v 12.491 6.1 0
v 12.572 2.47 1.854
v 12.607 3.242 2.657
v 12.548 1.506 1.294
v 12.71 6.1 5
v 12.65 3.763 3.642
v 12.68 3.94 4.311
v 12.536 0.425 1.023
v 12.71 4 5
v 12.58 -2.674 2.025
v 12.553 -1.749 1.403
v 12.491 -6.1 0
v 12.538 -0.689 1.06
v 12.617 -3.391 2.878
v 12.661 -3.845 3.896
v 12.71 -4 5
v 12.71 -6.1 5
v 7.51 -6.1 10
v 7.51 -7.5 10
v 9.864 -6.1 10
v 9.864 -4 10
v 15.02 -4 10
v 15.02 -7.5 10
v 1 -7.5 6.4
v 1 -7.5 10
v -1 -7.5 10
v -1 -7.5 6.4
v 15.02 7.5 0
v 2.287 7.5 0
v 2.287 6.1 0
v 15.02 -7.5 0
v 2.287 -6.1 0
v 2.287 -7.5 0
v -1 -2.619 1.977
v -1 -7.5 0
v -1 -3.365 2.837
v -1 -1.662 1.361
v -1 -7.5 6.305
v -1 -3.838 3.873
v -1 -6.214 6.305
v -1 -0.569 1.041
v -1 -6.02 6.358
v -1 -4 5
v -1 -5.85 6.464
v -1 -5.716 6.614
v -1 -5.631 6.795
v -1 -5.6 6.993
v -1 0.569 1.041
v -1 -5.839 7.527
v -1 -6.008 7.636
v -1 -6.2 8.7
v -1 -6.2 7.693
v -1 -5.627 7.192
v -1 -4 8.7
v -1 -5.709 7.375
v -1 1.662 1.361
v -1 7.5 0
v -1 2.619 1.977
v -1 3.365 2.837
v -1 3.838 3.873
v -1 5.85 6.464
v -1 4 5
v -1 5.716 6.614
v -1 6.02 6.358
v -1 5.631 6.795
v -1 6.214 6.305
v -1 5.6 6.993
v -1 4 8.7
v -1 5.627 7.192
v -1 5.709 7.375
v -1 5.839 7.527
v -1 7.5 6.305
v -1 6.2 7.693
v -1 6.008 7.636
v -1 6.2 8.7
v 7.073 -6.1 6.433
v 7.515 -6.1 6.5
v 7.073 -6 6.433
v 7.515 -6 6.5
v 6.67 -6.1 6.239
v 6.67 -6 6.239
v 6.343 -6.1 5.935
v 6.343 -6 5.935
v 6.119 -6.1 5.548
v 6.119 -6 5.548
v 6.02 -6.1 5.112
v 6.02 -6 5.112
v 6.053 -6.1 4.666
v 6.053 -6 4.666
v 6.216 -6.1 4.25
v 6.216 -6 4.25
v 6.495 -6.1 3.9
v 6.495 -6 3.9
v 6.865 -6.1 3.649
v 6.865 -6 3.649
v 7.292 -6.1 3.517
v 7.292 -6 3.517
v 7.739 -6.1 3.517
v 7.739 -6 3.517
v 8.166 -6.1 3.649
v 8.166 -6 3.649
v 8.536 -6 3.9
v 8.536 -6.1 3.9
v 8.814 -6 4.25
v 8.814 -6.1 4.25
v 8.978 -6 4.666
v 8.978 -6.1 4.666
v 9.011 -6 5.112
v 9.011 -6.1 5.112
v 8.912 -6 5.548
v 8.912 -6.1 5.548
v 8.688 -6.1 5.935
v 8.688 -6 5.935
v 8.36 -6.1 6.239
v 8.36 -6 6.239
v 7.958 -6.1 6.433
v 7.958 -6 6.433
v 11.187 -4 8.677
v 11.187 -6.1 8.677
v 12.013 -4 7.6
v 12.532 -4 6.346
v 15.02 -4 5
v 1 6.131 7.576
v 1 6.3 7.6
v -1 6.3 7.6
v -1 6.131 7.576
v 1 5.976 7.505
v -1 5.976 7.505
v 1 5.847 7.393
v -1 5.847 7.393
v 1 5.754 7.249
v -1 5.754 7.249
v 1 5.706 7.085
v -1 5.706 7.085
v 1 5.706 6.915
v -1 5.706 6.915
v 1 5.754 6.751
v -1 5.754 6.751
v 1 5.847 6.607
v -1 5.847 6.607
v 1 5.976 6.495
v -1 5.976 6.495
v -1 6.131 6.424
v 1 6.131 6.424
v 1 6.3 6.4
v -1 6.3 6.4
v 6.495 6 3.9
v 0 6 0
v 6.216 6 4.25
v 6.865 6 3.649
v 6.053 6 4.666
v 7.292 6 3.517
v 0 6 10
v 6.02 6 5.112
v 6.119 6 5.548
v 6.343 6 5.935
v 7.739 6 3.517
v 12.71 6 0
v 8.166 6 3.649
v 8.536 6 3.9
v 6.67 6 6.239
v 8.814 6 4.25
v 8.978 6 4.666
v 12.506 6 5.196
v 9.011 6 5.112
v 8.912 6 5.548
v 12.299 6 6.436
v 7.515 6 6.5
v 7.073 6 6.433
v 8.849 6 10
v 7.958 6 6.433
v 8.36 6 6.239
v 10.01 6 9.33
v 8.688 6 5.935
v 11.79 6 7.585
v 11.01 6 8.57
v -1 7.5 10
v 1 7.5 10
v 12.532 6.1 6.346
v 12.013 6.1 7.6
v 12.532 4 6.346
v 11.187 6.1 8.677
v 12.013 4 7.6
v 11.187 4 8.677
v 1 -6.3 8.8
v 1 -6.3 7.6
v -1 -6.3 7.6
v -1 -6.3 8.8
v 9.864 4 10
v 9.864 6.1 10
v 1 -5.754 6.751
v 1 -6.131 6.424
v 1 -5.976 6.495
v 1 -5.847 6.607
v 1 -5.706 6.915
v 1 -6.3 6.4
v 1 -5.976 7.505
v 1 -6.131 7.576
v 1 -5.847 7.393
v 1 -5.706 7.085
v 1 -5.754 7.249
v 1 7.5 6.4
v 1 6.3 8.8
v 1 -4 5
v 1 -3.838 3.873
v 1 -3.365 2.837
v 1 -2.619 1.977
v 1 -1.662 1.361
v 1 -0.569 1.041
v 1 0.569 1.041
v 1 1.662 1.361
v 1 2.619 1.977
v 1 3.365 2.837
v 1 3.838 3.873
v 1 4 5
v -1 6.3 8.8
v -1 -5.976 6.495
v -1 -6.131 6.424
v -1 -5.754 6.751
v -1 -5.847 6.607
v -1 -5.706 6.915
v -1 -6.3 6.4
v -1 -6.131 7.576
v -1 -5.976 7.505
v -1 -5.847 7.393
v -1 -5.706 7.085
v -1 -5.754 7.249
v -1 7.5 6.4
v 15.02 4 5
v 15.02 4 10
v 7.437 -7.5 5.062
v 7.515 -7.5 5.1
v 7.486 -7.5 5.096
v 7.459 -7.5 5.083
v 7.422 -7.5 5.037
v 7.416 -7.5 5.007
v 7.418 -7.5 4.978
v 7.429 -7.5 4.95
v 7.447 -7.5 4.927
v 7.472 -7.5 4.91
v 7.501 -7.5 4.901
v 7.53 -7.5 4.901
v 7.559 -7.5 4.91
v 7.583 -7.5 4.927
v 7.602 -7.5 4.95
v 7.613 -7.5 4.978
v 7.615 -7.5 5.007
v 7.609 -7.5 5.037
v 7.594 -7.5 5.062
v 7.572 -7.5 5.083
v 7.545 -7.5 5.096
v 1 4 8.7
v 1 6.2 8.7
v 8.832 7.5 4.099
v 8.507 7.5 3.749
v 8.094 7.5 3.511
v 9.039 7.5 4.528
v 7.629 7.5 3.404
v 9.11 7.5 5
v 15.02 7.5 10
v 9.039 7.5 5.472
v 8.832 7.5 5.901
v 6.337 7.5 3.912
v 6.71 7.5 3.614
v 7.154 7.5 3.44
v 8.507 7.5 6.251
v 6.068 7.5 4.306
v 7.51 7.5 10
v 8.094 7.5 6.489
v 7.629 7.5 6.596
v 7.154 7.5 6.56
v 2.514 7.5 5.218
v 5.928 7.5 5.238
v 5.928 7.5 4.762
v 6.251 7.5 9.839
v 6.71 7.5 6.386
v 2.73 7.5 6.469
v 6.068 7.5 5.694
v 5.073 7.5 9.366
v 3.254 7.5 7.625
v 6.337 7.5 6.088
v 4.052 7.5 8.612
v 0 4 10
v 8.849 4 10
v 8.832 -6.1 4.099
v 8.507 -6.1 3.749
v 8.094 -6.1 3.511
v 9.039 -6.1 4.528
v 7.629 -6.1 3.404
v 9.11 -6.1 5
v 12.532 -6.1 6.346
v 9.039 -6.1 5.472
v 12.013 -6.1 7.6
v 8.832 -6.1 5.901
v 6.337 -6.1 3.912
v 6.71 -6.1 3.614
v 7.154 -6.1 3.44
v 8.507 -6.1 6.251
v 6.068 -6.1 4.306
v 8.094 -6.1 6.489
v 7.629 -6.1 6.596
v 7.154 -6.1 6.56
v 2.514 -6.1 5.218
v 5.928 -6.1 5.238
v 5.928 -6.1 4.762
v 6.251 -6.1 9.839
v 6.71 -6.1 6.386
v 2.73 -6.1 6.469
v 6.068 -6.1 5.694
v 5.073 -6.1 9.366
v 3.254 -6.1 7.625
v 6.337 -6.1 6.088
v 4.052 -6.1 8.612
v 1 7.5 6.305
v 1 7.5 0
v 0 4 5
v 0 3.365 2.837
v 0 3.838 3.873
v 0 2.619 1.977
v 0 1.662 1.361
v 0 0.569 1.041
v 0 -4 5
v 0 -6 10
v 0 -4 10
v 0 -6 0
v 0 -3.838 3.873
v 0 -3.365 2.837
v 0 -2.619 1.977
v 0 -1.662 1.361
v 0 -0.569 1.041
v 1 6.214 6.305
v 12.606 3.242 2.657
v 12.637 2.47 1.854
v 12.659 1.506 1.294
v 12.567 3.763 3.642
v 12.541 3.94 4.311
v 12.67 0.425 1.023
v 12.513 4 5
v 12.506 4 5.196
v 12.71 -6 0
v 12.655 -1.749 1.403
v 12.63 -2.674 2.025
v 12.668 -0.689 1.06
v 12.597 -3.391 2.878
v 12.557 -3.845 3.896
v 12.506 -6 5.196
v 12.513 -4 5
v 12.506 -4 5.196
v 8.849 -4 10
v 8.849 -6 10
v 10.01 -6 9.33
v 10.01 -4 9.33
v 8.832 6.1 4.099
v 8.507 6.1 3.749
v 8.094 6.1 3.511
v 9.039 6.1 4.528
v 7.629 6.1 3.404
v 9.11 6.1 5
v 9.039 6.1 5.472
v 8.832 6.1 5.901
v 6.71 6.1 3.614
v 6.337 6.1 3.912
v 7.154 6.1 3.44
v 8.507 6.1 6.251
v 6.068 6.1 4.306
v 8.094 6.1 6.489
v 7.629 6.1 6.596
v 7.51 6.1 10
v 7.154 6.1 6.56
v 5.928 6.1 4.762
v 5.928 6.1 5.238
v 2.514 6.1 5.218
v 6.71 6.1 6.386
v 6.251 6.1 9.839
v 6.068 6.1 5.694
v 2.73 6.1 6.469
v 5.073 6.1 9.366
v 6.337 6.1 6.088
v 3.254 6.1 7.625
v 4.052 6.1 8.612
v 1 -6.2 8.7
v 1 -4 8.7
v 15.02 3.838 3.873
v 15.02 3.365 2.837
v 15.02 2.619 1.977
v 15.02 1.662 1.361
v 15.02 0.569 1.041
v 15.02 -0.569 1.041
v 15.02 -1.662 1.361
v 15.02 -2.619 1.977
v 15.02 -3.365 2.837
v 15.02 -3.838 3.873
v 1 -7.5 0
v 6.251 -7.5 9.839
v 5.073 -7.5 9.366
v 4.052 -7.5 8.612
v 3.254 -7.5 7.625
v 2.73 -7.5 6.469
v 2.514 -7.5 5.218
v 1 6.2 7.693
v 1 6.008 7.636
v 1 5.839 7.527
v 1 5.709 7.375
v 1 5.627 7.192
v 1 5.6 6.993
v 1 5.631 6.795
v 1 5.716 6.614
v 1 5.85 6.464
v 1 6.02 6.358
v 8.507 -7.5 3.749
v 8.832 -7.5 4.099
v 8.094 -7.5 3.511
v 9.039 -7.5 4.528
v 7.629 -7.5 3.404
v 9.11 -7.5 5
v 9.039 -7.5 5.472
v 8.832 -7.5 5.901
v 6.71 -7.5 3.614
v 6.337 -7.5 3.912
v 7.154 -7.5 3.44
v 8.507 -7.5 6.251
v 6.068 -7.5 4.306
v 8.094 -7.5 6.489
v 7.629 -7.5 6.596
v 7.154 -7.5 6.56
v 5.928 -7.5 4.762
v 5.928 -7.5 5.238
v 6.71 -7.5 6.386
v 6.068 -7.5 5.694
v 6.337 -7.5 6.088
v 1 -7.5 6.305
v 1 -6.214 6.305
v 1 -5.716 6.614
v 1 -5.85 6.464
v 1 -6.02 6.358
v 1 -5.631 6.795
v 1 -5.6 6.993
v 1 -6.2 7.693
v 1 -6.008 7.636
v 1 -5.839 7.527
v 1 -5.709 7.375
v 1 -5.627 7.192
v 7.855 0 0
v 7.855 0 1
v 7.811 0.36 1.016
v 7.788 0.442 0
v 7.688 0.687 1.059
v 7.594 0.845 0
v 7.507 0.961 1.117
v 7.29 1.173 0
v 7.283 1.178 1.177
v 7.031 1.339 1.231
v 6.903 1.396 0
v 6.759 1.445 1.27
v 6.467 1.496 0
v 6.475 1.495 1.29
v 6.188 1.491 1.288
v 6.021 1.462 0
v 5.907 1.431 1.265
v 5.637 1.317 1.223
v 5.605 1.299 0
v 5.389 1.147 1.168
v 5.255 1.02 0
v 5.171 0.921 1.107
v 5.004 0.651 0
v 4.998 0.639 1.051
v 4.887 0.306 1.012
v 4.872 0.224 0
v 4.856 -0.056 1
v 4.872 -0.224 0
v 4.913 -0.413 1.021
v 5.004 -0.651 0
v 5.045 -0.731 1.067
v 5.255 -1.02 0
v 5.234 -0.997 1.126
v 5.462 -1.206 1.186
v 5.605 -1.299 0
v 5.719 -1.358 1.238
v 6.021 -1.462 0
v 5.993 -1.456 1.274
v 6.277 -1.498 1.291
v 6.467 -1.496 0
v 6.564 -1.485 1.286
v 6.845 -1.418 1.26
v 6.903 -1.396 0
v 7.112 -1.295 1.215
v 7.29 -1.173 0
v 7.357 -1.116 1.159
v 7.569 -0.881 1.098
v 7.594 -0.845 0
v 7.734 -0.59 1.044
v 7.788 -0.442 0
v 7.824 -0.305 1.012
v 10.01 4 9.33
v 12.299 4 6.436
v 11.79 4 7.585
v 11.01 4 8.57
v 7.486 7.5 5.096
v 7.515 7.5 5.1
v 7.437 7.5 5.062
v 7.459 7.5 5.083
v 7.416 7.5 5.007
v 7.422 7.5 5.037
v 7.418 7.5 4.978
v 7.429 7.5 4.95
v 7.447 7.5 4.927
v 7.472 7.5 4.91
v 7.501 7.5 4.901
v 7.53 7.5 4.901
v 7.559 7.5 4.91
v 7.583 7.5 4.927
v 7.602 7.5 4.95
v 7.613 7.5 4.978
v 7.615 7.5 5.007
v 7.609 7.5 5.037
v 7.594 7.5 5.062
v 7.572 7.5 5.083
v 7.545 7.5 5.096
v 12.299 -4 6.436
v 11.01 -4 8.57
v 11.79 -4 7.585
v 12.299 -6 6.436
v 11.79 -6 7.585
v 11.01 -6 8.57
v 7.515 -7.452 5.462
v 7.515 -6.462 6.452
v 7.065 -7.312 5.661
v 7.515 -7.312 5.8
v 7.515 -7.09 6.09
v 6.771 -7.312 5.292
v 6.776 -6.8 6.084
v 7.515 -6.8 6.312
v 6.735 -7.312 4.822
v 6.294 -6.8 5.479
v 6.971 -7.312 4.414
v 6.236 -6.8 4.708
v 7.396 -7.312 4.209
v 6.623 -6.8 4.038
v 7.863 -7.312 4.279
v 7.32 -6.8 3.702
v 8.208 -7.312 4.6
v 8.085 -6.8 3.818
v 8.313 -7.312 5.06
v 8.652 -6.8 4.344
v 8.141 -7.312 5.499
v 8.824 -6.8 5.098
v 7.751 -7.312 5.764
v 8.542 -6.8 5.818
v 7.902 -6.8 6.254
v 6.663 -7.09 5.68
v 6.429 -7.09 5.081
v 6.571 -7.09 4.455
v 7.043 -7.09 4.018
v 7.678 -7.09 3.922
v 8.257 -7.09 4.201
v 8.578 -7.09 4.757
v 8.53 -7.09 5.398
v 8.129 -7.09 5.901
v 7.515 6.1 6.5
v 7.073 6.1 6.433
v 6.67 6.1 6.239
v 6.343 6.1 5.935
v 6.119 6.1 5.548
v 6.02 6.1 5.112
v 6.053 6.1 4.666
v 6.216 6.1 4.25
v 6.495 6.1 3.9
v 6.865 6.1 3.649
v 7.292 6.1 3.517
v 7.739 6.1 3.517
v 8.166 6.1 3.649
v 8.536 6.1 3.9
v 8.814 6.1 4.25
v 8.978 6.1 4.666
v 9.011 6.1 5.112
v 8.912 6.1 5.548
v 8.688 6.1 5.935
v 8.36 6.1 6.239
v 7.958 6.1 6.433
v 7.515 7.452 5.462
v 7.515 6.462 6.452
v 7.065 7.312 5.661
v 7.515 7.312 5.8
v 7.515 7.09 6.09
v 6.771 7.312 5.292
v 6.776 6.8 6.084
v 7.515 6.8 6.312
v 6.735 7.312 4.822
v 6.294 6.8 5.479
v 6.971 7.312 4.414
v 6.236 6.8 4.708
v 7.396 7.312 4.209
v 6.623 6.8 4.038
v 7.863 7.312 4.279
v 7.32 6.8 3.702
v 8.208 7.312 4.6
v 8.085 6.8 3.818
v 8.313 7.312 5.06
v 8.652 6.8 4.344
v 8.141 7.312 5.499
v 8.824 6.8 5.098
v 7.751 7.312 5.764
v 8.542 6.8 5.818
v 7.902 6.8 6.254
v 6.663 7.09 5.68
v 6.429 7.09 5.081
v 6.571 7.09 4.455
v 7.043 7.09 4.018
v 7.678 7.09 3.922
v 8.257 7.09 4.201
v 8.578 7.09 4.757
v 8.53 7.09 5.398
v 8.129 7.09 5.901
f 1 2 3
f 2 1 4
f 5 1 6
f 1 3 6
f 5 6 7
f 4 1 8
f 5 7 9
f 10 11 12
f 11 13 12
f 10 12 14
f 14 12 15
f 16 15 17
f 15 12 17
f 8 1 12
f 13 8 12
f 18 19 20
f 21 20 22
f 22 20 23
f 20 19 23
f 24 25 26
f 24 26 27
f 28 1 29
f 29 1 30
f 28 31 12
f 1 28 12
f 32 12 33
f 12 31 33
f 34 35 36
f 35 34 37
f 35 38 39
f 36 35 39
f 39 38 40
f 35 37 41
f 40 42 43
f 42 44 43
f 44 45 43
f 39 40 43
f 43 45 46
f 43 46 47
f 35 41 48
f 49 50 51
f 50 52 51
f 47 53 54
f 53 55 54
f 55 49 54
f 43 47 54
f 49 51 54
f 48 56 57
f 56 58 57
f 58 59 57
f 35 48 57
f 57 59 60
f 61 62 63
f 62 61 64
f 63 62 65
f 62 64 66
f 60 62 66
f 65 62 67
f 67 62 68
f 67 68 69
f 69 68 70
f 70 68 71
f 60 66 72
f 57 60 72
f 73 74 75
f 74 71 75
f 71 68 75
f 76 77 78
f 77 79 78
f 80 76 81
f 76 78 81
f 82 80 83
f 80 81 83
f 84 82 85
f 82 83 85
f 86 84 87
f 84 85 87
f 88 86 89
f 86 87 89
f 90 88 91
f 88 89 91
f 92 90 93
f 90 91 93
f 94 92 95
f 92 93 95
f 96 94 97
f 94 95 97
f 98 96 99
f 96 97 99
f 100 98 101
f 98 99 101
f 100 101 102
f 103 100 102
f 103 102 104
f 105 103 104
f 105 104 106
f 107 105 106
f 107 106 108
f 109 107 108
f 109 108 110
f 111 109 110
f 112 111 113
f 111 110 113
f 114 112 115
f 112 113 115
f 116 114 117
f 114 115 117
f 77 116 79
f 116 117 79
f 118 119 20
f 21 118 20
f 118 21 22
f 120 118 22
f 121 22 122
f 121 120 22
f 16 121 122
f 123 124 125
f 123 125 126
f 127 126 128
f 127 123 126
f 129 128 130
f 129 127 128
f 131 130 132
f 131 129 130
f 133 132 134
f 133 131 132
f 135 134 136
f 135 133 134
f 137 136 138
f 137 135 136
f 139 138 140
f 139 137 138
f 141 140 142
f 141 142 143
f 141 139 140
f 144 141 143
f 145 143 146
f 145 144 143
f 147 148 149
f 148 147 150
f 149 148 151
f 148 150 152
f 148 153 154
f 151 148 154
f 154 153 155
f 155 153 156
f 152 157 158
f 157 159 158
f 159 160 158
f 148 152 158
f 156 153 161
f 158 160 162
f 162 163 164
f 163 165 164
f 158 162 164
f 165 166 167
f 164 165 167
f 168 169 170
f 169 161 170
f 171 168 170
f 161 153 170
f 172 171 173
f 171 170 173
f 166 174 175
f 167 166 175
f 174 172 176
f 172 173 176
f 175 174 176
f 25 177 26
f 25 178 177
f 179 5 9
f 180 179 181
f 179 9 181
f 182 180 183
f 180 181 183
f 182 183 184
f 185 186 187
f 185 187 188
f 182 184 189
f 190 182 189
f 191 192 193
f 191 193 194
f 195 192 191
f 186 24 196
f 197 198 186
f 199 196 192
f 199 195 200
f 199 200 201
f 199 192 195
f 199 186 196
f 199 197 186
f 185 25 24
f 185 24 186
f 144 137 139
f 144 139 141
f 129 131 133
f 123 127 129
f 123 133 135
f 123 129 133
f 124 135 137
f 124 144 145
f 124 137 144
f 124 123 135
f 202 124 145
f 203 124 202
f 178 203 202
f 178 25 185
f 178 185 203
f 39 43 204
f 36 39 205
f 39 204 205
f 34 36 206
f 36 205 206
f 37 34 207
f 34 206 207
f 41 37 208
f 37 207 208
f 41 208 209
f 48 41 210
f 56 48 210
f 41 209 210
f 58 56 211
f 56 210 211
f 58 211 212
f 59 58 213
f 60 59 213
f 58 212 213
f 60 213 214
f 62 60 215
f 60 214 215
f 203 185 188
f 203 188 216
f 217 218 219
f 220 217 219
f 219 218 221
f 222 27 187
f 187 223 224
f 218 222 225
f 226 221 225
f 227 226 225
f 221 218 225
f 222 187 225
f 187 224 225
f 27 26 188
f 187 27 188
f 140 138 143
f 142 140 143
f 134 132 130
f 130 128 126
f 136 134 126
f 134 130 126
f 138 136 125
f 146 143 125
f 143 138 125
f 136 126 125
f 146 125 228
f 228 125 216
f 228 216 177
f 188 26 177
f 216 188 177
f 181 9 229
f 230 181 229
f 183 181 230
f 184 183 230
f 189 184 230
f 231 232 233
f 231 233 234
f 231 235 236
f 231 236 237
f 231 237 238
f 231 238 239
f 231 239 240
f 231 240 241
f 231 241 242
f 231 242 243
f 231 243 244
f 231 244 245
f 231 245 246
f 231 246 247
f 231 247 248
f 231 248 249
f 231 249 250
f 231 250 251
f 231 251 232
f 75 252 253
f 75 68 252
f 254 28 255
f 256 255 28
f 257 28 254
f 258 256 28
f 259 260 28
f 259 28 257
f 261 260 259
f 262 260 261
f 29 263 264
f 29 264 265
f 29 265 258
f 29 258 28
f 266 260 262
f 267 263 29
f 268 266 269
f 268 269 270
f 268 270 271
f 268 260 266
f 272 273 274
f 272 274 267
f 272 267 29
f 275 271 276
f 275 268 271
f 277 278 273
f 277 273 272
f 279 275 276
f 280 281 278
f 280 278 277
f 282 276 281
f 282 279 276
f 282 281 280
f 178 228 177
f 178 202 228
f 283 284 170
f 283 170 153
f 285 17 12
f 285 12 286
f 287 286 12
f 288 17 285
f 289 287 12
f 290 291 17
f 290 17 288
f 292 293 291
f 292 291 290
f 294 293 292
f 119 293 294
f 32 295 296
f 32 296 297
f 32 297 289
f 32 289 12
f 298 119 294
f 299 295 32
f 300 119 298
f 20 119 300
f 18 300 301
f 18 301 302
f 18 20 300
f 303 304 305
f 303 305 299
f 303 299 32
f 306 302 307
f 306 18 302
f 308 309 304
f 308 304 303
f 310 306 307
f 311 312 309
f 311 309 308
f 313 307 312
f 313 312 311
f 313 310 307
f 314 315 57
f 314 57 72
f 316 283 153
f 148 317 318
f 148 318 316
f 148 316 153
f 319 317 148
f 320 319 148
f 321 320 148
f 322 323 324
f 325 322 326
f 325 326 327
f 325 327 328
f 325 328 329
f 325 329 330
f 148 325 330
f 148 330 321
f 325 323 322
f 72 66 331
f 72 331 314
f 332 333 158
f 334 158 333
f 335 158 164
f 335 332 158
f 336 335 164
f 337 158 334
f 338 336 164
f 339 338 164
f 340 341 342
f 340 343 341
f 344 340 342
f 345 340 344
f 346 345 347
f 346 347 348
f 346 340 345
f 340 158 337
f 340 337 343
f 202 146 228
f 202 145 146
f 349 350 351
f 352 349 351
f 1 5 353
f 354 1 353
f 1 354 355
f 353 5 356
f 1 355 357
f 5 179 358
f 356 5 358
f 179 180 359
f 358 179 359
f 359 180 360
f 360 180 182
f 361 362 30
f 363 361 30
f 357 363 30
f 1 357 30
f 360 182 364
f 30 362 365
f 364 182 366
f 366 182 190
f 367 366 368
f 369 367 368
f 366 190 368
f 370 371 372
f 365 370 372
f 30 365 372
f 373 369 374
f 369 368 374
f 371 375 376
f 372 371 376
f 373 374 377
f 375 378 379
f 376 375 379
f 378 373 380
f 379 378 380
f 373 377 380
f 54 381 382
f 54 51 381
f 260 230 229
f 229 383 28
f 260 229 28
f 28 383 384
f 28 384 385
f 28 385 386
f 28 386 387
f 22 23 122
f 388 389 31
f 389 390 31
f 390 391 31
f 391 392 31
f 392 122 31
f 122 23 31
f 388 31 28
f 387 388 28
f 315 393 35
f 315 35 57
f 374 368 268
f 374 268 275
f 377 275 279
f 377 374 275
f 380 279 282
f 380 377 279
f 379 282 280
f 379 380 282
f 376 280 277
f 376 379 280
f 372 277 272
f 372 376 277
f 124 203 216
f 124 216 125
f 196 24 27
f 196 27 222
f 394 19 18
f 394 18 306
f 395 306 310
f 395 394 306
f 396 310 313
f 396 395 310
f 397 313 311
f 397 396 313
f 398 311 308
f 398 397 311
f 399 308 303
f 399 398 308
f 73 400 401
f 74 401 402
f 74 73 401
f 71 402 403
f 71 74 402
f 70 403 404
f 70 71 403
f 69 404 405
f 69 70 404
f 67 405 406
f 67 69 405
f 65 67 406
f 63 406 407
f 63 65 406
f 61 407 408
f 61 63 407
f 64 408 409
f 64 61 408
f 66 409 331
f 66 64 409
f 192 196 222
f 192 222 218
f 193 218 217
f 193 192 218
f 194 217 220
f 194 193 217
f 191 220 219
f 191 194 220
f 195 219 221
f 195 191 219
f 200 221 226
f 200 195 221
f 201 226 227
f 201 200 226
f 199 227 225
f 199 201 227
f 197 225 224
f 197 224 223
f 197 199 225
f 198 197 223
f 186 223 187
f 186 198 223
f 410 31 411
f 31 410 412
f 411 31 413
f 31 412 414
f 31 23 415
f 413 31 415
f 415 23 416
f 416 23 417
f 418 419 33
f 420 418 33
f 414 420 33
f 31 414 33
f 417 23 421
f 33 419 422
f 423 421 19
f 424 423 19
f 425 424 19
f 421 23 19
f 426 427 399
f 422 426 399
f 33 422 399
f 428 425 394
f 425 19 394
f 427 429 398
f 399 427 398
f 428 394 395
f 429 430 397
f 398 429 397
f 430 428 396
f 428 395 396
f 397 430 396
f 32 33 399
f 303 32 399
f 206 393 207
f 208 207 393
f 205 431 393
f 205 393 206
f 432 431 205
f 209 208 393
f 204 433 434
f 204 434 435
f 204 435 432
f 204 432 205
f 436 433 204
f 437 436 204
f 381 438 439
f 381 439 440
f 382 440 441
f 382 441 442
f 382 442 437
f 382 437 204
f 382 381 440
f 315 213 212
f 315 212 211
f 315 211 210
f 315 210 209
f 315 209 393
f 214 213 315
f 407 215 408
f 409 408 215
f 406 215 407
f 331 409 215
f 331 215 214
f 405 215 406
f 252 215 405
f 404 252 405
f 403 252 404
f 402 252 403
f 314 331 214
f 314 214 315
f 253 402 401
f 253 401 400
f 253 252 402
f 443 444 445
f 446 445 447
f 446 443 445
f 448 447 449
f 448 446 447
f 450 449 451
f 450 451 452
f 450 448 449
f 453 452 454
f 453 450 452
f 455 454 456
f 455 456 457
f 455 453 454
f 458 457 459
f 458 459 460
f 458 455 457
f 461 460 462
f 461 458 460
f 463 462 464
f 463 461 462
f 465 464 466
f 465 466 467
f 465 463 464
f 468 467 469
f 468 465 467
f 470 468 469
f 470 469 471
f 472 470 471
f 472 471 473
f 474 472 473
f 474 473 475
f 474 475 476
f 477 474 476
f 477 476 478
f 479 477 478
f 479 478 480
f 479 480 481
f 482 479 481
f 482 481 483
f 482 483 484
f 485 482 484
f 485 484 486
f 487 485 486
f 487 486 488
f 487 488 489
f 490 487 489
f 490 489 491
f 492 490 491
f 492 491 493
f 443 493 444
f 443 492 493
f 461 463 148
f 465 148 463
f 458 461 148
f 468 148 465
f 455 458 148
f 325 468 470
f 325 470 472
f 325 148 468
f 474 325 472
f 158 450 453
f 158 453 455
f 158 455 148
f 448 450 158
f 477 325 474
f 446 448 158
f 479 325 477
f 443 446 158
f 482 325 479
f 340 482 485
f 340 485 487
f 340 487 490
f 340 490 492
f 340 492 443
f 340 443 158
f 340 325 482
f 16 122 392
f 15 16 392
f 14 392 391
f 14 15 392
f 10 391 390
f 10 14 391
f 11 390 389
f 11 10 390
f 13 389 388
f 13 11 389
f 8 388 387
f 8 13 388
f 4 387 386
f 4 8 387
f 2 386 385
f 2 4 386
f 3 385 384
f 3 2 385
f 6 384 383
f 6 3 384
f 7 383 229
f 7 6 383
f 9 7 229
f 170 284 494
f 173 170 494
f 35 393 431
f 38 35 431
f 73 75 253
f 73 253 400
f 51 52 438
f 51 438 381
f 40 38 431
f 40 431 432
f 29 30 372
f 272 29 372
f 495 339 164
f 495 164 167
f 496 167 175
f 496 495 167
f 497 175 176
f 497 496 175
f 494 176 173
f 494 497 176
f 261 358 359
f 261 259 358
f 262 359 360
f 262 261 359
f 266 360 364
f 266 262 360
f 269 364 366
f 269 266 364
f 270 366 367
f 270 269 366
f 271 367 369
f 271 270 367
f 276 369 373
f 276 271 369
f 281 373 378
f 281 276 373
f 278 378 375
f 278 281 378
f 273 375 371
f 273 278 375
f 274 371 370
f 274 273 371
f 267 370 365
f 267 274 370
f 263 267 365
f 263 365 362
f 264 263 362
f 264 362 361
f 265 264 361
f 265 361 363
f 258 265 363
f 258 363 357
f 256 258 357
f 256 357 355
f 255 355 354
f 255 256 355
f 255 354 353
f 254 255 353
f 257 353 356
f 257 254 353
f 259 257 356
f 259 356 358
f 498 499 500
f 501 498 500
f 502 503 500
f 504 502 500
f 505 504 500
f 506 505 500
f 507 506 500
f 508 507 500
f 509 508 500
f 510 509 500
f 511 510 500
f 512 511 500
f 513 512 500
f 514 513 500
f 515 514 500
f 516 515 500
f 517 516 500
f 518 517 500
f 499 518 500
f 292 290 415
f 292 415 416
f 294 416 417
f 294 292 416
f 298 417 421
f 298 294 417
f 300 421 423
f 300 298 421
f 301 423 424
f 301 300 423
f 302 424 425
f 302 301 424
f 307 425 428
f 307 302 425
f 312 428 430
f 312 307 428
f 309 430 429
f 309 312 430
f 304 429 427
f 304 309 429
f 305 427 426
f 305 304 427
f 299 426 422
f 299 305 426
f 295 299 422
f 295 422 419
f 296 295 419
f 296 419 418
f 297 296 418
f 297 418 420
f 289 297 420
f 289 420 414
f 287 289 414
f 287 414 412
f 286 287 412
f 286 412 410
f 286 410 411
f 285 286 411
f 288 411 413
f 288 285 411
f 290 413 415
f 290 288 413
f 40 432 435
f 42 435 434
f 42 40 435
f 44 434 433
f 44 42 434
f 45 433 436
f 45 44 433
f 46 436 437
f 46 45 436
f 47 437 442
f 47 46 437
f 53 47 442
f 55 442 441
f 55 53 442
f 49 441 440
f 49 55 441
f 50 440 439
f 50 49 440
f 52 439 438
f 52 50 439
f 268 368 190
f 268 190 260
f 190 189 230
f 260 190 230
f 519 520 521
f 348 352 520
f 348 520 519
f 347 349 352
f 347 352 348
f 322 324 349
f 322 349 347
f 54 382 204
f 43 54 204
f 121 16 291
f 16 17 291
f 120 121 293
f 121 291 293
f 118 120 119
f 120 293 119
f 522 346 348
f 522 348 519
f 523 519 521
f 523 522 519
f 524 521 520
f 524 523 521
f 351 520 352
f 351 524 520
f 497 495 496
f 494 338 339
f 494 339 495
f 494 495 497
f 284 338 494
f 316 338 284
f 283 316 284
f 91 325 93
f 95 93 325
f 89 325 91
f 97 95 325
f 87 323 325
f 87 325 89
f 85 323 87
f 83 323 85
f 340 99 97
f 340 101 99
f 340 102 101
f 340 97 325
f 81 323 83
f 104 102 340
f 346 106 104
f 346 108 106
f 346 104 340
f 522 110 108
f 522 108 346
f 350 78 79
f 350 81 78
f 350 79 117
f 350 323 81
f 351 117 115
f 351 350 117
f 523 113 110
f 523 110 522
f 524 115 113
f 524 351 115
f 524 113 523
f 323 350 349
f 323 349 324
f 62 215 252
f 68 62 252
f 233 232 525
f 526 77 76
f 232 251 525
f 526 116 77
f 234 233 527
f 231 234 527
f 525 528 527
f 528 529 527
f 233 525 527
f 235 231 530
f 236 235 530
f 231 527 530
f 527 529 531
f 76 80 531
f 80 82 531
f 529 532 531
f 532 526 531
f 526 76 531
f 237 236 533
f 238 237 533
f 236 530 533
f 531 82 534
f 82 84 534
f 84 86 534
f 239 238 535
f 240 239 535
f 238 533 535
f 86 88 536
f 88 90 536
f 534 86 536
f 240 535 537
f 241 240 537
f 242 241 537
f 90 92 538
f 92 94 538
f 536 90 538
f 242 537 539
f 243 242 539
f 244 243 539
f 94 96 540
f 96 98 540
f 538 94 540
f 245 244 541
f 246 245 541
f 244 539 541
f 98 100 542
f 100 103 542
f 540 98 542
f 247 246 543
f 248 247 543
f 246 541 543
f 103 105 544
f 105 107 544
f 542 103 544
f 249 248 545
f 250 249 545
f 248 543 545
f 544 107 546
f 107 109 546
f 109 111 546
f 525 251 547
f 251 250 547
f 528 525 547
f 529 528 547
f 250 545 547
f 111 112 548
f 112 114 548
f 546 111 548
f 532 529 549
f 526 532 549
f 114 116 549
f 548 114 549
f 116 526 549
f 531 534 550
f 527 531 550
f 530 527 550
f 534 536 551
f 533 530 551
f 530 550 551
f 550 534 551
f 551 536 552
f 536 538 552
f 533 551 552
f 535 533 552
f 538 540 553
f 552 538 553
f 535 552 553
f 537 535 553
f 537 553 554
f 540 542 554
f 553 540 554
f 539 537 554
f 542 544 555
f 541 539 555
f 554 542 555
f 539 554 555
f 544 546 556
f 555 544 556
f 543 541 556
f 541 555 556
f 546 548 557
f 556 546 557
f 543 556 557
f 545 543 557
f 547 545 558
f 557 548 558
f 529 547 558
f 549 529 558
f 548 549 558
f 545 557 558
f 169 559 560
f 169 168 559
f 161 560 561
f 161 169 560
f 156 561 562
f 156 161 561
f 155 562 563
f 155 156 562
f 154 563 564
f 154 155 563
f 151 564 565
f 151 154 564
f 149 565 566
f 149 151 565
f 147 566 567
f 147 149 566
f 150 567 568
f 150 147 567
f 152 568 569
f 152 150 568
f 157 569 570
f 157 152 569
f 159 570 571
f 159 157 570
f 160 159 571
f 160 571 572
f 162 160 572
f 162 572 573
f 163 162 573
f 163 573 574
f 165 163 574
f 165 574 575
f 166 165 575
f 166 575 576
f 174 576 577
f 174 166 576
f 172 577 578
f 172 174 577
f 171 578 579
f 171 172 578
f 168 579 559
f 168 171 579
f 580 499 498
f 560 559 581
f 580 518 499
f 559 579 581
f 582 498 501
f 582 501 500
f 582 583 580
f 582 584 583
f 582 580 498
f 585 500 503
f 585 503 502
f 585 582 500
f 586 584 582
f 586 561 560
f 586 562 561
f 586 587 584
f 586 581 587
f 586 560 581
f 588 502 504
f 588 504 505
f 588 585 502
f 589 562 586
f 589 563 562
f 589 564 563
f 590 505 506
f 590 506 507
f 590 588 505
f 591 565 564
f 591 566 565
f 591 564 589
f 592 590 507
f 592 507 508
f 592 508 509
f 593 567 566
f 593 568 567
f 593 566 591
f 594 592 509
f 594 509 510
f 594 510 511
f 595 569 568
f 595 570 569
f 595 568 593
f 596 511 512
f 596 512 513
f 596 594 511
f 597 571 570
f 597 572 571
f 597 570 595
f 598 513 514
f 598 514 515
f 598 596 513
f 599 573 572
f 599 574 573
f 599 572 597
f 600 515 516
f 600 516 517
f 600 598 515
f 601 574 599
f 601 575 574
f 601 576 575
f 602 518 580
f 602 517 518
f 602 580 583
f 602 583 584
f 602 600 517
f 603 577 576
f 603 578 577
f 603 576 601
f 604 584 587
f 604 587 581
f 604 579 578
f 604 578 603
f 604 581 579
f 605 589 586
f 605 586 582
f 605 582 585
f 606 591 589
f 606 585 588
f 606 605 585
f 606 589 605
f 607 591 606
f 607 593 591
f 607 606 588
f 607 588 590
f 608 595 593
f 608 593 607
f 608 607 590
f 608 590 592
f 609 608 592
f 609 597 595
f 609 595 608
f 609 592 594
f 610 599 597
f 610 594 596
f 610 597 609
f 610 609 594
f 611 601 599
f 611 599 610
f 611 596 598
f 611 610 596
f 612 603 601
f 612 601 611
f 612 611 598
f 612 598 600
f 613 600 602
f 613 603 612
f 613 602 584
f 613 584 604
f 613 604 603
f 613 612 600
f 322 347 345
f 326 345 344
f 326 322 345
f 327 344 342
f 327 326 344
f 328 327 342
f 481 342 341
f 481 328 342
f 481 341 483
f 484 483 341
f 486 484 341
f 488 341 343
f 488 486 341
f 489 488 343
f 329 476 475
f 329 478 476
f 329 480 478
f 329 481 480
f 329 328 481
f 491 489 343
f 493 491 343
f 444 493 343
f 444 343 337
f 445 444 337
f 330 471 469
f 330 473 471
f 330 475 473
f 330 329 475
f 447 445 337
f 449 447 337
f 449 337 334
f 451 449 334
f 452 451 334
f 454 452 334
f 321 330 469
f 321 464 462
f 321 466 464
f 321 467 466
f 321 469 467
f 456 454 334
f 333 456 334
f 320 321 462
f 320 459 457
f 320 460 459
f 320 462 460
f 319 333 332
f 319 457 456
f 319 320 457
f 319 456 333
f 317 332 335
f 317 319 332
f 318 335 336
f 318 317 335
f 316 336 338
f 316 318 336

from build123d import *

# Parameters (mm, degrees)
PAD_DEPTH            = 6
POCKET002_DEPTH      = 0.001
POCKET002_DEPTH_BACK = -12.710942
SKETCH012_R          = 1.5
POCKET005_DEPTH      = 10.001
POCKET005_DEPTH_BACK = 0.001
SKETCH001_R          = 1.6
PAD001_DEPTH         = 7.5
SKETCH003_R          = 1.6
POCKET_DEPTH         = 6.1
POCKET001_DEPTH      = 0.001
POCKET001_DEPTH_BACK = -15.02072
PAD002_DEPTH         = 1
SKETCH010_W          = 15
SKETCH010_H          = 10
PAD004_DEPTH         = 1
POCKET003_DEPTH      = 1.001
POCKET003_DEPTH_BACK = -1.001
POCKET004_DEPTH      = 1.001
POCKET004_DEPTH_BACK = -1.001


with BuildPart() as inner:
    # Sketch → Pad (new body, symmetric)
    with BuildSketch(Plane.XZ):
        with BuildLine():
            Line((0, 0), (12.709942, 0))
            Line((12.709942, 0), (12.505779, 5.196299))
            ThreePointArc((12.505779, 5.196299), (11.789842, 7.584534), (10.009634, 9.330127))
            Line((8.84938, 10), (10.009634, 9.330127))
            Line((7.509634, 10), (8.84938, 10))
            Line((7.509634, 10), (0, 10))
            Line((0, 10), (0, 0))
        make_face()
    extrude(amount=PAD_DEPTH, both=True)

    # Sketch005 (on DatumPlane) → Revolution (revolve)
    with BuildSketch(Plane(origin=(7.515413, -6, 5), x_dir=(0, -1, 0), z_dir=(-1, 0, 0))):
        with BuildLine():
            Line((0, 0), (1.5, 0))
            Line((1.5, 0.1), (1.5, 0))
            ThreePointArc((1.5, 0.1), (1.089949, 1.089949), (0.1, 1.5))
            Line((0.1, 1.5), (0, 1.5))
            Line((0, 1.5), (0, 0))
        make_face()
    revolution = revolve(axis=Axis((7.515413, -6, 5), (0, -1, 0)))

    # Mirrored: Revolution across XZ
    add(revolution.mirror(Plane.XZ))

    # Sketch007 → Pocket002 (cut, two sides)
    with BuildSketch(Plane.YZ) as pocket002_sk:
        with BuildLine():
            ThreePointArc((-4, 5), (0, 1), (4, 5))
            Line((4, 5), (4, 10))
            Line((4, 10), (-4, 10))
            Line((-4, 10), (-4, 5))
        make_face()
    extrude(amount=-POCKET002_DEPTH, mode=Mode.SUBTRACT)
    extrude(pocket002_sk.sketch, amount=-POCKET002_DEPTH_BACK, mode=Mode.SUBTRACT)

    # Sketch012 → Pocket005 (cut, two sides)
    with BuildSketch(Plane.XY) as pocket005_sk:
        with Locations((6.354971, 0)):
            Circle(SKETCH012_R)
    extrude(amount=POCKET005_DEPTH, mode=Mode.SUBTRACT)
    extrude(pocket005_sk.sketch, amount=-POCKET005_DEPTH_BACK, mode=Mode.SUBTRACT)


with BuildPart() as outer:
    # Sketch001 → Pad001 (new body, symmetric)
    with BuildSketch(Plane.XZ):
        with BuildLine():
            Line((15.01972, 10), (15.01972, 0))
            Line((15.01972, 0), (2.286566, 0))
            Line((2.286566, 0), (2.514393, 5.218097))
            ThreePointArc((7.509634, 10), (4.052069, 8.61182), (2.514393, 5.218097))
            Line((7.509634, 10), (15.01972, 10))
        make_face()
        with Locations((7.509634, 5)):
            Circle(SKETCH001_R, mode=Mode.SUBTRACT)
    extrude(amount=PAD001_DEPTH, both=True)

    # Sketch003 → Pocket (cut, symmetric)
    with BuildSketch(Plane.XZ):
        with BuildLine():
            Line((2.286566, 0), (2.514393, 5.218097))
            ThreePointArc((7.509634, 10), (4.052069, 8.61182), (2.514393, 5.218097))
            Line((9.863545, 10), (7.509634, 10))
            Line((11.186589, 8.676955), (9.863545, 10))
            ThreePointArc((12.709634, 5), (12.313808, 6.989954), (11.186589, 8.676955))
            Line((12.491329, 0), (12.709634, 5))
            Line((2.514393, 0), (12.491329, 0))
            Line((2.286566, 0), (2.514393, 0))
        make_face()
        with Locations((7.509634, 5)):
            Circle(SKETCH003_R, mode=Mode.SUBTRACT)
    extrude(amount=POCKET_DEPTH, both=True, mode=Mode.SUBTRACT)

    # Sketch006 → Pocket001 (cut, two sides)
    with BuildSketch(Plane.YZ) as pocket001_sk:
        with BuildLine():
            ThreePointArc((-4, 5.000021), (0, 1), (4, 5.000021))
            Line((4, 5.000021), (4, 10))
            Line((4, 10), (-4, 10))
            Line((-4, 10), (-4, 5.000021))
        make_face()
    extrude(amount=-POCKET001_DEPTH, mode=Mode.SUBTRACT)
    extrude(pocket001_sk.sketch, amount=-POCKET001_DEPTH_BACK, mode=Mode.SUBTRACT)


with BuildPart() as separator_clip:
    # Sketch008 → Pad002 (new body, symmetric)
    with BuildSketch(Plane.YZ):
        with BuildLine():
            Line((7.5, 10), (-7.5, 10))
            Line((-7.5, 10), (-7.5, 6.4))
            Line((-7.5, 6.4), (-6.3, 6.4))
            ThreePointArc((-6.3, 6.4), (-5.700005, 7), (-6.3, 7.6))
            Line((-6.3, 7.6), (-6.3, 8.8))
            Line((-6.3, 8.8), (6.3, 8.8))
            Line((6.3, 8.8), (6.3, 7.6))
            ThreePointArc((6.3, 7.6), (5.700005, 7), (6.3, 6.4))
            Line((6.3, 6.4), (7.5, 6.4))
            Line((7.5, 6.4), (7.5, 10))
        make_face()
    extrude(amount=PAD002_DEPTH, both=True)


with BuildPart() as separator:
    # Sketch010 → Pad004 (new body, symmetric)
    with BuildSketch(Plane.YZ):
        with Locations((0, 5)):
            Rectangle(SKETCH010_W, SKETCH010_H)
    extrude(amount=PAD004_DEPTH, both=True)

    # Sketch009 → Pocket003 (cut, two sides)
    with BuildSketch(Plane.YZ) as pocket003_sk:
        with BuildLine():
            Line((7.5, 10), (-7.5, 10))
            Line((-7.5, 10), (-7.5, 6.305353))
            Line((-7.5, 6.305353), (-6.213595, 6.305353))
            ThreePointArc((-6.213595, 6.305353), (-5.600034, 6.993141), (-6.2, 7.69282))
            Line((-6.2, 7.69282), (-6.2, 8.7))
            Line((-6.2, 8.7), (6.2, 8.7))
            Line((6.2, 8.7), (6.2, 7.69282))
            ThreePointArc((6.2, 7.69282), (5.600034, 6.993141), (6.213595, 6.305353))
            Line((6.213595, 6.305353), (7.5, 6.305353))
            Line((7.5, 6.305353), (7.5, 10))
        make_face()
    extrude(amount=-POCKET003_DEPTH, mode=Mode.SUBTRACT)
    extrude(pocket003_sk.sketch, amount=-POCKET003_DEPTH_BACK, mode=Mode.SUBTRACT)

    # Sketch011 → Pocket004 (cut, two sides)
    with BuildSketch(Plane.YZ) as pocket004_sk:
        with BuildLine():
            ThreePointArc((-4, 5), (0, 1), (4, 5))
            Line((4, 5), (4, 10))
            Line((4, 10), (-4, 10))
            Line((-4, 10), (-4, 5))
        make_face()
    extrude(amount=-POCKET004_DEPTH, mode=Mode.SUBTRACT)
    extrude(pocket004_sk.sketch, amount=-POCKET004_DEPTH_BACK, mode=Mode.SUBTRACT)


solid = Compound([inner.part, outer.part, separator_clip.part, separator.part])
